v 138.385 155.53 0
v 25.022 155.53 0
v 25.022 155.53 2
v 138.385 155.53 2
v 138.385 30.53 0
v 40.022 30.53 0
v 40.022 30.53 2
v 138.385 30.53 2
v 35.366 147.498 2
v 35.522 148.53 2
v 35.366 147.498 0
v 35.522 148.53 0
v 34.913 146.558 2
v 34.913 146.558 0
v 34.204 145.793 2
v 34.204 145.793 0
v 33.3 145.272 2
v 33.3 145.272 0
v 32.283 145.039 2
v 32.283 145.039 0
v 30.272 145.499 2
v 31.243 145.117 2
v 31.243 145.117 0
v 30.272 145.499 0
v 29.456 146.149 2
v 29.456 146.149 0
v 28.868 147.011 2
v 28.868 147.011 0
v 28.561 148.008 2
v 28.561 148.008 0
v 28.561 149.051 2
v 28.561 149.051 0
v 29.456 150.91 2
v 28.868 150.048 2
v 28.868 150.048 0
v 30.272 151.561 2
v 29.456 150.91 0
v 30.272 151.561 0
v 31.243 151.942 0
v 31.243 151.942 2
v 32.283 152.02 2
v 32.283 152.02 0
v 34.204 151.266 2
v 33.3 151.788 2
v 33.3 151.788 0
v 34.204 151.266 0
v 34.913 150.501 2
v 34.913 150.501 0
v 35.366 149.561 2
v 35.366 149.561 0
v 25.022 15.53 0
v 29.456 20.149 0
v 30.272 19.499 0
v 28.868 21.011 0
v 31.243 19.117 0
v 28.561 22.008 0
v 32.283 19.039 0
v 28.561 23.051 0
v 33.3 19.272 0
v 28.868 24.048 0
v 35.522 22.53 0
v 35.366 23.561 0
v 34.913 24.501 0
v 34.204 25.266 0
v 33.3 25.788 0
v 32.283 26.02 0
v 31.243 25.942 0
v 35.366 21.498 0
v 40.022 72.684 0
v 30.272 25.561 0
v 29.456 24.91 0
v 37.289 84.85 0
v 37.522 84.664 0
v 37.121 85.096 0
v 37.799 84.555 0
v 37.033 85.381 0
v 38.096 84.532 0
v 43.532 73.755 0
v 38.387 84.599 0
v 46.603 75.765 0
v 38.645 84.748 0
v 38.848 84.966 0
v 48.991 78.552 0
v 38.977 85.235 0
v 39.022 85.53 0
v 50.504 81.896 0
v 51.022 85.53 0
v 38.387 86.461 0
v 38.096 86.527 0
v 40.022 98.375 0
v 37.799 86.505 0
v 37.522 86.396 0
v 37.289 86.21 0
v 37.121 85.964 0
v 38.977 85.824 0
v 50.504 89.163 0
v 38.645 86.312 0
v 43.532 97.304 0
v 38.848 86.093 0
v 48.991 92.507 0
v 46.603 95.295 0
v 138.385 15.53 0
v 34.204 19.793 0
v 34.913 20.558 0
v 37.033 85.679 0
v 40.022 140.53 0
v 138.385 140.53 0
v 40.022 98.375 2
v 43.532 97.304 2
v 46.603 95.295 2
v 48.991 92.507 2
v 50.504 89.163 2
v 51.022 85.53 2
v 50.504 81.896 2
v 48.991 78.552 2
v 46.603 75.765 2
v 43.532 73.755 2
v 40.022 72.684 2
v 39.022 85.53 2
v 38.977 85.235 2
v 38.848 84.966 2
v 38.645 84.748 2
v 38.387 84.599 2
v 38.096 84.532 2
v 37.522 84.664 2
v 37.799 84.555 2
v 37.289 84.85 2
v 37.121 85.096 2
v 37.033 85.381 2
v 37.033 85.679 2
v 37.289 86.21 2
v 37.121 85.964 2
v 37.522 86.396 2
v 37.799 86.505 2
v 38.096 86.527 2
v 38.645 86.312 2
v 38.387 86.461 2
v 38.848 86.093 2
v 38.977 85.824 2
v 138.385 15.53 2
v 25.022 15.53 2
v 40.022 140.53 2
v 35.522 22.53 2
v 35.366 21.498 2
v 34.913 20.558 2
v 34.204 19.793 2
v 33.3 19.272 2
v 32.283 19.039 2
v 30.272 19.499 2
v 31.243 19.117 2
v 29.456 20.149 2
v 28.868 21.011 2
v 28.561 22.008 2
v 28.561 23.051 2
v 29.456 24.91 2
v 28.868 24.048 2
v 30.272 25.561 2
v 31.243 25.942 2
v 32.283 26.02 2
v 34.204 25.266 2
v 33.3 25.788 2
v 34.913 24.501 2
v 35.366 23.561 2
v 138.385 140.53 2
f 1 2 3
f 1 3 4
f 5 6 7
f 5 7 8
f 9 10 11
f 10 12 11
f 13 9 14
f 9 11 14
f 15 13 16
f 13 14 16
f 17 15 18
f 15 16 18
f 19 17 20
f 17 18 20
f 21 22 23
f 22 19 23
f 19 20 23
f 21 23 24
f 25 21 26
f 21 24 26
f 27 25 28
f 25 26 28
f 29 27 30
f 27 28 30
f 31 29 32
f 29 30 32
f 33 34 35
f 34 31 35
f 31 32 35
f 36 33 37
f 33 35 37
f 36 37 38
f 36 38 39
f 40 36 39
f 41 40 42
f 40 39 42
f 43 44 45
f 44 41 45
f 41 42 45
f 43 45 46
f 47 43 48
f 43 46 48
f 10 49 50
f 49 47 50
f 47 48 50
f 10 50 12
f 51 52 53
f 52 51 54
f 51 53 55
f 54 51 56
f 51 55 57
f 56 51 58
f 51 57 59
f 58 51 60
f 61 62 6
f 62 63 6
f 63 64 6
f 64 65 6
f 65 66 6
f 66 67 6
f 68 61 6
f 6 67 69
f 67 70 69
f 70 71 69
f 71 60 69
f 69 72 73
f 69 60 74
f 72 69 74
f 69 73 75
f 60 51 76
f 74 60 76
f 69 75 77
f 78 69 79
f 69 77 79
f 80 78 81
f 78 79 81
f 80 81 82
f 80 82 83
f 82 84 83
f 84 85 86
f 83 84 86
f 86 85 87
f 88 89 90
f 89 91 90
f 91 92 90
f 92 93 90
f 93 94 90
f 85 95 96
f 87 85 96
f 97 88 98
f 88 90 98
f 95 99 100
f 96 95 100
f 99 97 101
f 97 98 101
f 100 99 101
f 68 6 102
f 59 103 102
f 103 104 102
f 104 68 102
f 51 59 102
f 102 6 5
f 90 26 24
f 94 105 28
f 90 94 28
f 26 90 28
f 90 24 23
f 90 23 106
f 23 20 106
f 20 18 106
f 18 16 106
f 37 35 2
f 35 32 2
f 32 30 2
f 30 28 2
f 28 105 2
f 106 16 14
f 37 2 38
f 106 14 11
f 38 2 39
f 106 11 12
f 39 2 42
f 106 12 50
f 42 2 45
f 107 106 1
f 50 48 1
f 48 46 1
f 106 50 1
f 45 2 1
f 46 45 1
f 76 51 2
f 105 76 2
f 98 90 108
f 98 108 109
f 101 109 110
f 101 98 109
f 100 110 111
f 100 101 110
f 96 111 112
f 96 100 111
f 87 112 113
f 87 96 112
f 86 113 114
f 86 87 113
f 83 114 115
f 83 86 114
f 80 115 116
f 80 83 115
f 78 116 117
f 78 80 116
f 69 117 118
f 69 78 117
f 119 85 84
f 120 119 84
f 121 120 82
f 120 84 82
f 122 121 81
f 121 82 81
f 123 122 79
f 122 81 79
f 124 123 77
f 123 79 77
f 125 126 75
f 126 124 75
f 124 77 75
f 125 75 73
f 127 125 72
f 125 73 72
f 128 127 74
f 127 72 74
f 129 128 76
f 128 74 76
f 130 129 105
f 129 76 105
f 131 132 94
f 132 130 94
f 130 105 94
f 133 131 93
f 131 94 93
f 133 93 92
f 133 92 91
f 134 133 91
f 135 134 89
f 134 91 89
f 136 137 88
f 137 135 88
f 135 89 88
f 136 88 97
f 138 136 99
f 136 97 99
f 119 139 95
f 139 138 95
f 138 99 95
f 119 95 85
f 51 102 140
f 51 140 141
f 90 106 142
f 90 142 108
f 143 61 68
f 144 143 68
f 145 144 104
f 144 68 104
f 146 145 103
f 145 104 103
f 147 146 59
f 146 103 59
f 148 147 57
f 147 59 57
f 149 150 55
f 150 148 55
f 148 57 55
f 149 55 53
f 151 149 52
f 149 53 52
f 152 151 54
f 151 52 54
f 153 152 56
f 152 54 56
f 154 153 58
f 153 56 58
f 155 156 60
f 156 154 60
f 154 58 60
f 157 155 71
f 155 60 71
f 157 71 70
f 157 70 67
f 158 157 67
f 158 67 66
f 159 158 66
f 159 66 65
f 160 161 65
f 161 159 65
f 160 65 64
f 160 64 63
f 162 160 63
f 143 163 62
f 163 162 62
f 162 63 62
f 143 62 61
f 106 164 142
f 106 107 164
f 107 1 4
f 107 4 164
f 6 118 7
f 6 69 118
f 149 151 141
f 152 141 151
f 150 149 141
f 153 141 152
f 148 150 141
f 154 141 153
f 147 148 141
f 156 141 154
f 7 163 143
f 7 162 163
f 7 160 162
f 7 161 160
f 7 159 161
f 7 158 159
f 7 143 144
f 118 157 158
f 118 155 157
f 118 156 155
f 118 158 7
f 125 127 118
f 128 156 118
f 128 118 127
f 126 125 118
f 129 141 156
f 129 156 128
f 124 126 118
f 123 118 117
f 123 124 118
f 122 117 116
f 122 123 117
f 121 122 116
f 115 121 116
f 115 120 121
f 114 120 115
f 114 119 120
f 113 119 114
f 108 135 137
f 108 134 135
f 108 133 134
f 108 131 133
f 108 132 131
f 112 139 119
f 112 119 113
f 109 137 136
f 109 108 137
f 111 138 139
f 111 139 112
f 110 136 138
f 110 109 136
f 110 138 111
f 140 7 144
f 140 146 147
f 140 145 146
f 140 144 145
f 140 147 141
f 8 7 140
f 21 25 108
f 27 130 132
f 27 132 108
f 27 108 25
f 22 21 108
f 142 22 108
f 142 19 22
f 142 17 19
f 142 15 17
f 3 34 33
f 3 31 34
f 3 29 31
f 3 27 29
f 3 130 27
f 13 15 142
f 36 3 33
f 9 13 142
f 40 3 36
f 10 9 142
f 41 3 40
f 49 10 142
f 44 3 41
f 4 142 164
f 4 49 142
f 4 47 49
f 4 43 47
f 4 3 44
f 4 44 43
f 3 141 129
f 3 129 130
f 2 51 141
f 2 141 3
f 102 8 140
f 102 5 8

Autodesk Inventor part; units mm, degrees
ref_plane "YZ Plane" through (0, 0, 0) normal (1, 0, 0) x (0, 1, 0)
ref_plane "XZ Plane" through (0, 0, 0) normal (0, 1, 0) x (-1, 0, 0)
ref_plane "XY Plane" through (0, 0, 0) normal (0, 0, 1) x (1, 0, 0)
sketch "Boceto1" plane through (0, 0, 0) normal (0, 0, 1) x (1, 0, 0)
  circle A0 centre (32.0216, 148.5297) radius 3.5
  line L0 (40.0216, 140.5297) -> (40.0216, 98.3749)
  line L1 (40.0216, 72.6844) -> (40.0216, 30.5297)
  line L2 (25.0216, 15.5297) -> (25.0216, 155.5297)
  line L3 (40.0216, 30.5297) -> (138.3848, 30.5297)
  line L4 (6.0787, 0.7542) -> (6.0787, 166.9226)
  line L5 (163.6392, 166.9226) -> (163.6392, 0.7542)
  line L6 (138.3848, 15.5297) -> (25.0216, 15.5297)
  line L7 (163.6392, 0.7542) -> (6.0787, 0.7542)
  arc A1 (40.0216, 72.6844) -> (40.0216, 98.3749) centre (38.0216, 85.5297) ccw
  line L8 (138.3848, 30.5297) -> (138.3848, 15.5297)
  line L9 (138.3848, 155.5297) -> (138.3848, 140.5297)
  line L10 (138.3848, 140.5297) -> (40.0216, 140.5297)
  line L11 (6.0787, 166.9226) -> (163.6392, 166.9226)
  line L12 (25.0216, 155.5297) -> (138.3848, 155.5297)
  circle A2 centre (32.0216, 22.5297) radius 3.5
  circle A3 centre (38.0216, 85.5297) radius 1
  point P0 (0, 0)
  point P1 (0, 0)
  point P2 (40.0216, 98.3749)
  dimension "d0" = 2
extrude "Extrusión1" add sketch "Boceto1" along normal blind 2 contours L0 A1 L1 L3 L8 L6 L2 L12 L9 L10
properties part number "P8"
